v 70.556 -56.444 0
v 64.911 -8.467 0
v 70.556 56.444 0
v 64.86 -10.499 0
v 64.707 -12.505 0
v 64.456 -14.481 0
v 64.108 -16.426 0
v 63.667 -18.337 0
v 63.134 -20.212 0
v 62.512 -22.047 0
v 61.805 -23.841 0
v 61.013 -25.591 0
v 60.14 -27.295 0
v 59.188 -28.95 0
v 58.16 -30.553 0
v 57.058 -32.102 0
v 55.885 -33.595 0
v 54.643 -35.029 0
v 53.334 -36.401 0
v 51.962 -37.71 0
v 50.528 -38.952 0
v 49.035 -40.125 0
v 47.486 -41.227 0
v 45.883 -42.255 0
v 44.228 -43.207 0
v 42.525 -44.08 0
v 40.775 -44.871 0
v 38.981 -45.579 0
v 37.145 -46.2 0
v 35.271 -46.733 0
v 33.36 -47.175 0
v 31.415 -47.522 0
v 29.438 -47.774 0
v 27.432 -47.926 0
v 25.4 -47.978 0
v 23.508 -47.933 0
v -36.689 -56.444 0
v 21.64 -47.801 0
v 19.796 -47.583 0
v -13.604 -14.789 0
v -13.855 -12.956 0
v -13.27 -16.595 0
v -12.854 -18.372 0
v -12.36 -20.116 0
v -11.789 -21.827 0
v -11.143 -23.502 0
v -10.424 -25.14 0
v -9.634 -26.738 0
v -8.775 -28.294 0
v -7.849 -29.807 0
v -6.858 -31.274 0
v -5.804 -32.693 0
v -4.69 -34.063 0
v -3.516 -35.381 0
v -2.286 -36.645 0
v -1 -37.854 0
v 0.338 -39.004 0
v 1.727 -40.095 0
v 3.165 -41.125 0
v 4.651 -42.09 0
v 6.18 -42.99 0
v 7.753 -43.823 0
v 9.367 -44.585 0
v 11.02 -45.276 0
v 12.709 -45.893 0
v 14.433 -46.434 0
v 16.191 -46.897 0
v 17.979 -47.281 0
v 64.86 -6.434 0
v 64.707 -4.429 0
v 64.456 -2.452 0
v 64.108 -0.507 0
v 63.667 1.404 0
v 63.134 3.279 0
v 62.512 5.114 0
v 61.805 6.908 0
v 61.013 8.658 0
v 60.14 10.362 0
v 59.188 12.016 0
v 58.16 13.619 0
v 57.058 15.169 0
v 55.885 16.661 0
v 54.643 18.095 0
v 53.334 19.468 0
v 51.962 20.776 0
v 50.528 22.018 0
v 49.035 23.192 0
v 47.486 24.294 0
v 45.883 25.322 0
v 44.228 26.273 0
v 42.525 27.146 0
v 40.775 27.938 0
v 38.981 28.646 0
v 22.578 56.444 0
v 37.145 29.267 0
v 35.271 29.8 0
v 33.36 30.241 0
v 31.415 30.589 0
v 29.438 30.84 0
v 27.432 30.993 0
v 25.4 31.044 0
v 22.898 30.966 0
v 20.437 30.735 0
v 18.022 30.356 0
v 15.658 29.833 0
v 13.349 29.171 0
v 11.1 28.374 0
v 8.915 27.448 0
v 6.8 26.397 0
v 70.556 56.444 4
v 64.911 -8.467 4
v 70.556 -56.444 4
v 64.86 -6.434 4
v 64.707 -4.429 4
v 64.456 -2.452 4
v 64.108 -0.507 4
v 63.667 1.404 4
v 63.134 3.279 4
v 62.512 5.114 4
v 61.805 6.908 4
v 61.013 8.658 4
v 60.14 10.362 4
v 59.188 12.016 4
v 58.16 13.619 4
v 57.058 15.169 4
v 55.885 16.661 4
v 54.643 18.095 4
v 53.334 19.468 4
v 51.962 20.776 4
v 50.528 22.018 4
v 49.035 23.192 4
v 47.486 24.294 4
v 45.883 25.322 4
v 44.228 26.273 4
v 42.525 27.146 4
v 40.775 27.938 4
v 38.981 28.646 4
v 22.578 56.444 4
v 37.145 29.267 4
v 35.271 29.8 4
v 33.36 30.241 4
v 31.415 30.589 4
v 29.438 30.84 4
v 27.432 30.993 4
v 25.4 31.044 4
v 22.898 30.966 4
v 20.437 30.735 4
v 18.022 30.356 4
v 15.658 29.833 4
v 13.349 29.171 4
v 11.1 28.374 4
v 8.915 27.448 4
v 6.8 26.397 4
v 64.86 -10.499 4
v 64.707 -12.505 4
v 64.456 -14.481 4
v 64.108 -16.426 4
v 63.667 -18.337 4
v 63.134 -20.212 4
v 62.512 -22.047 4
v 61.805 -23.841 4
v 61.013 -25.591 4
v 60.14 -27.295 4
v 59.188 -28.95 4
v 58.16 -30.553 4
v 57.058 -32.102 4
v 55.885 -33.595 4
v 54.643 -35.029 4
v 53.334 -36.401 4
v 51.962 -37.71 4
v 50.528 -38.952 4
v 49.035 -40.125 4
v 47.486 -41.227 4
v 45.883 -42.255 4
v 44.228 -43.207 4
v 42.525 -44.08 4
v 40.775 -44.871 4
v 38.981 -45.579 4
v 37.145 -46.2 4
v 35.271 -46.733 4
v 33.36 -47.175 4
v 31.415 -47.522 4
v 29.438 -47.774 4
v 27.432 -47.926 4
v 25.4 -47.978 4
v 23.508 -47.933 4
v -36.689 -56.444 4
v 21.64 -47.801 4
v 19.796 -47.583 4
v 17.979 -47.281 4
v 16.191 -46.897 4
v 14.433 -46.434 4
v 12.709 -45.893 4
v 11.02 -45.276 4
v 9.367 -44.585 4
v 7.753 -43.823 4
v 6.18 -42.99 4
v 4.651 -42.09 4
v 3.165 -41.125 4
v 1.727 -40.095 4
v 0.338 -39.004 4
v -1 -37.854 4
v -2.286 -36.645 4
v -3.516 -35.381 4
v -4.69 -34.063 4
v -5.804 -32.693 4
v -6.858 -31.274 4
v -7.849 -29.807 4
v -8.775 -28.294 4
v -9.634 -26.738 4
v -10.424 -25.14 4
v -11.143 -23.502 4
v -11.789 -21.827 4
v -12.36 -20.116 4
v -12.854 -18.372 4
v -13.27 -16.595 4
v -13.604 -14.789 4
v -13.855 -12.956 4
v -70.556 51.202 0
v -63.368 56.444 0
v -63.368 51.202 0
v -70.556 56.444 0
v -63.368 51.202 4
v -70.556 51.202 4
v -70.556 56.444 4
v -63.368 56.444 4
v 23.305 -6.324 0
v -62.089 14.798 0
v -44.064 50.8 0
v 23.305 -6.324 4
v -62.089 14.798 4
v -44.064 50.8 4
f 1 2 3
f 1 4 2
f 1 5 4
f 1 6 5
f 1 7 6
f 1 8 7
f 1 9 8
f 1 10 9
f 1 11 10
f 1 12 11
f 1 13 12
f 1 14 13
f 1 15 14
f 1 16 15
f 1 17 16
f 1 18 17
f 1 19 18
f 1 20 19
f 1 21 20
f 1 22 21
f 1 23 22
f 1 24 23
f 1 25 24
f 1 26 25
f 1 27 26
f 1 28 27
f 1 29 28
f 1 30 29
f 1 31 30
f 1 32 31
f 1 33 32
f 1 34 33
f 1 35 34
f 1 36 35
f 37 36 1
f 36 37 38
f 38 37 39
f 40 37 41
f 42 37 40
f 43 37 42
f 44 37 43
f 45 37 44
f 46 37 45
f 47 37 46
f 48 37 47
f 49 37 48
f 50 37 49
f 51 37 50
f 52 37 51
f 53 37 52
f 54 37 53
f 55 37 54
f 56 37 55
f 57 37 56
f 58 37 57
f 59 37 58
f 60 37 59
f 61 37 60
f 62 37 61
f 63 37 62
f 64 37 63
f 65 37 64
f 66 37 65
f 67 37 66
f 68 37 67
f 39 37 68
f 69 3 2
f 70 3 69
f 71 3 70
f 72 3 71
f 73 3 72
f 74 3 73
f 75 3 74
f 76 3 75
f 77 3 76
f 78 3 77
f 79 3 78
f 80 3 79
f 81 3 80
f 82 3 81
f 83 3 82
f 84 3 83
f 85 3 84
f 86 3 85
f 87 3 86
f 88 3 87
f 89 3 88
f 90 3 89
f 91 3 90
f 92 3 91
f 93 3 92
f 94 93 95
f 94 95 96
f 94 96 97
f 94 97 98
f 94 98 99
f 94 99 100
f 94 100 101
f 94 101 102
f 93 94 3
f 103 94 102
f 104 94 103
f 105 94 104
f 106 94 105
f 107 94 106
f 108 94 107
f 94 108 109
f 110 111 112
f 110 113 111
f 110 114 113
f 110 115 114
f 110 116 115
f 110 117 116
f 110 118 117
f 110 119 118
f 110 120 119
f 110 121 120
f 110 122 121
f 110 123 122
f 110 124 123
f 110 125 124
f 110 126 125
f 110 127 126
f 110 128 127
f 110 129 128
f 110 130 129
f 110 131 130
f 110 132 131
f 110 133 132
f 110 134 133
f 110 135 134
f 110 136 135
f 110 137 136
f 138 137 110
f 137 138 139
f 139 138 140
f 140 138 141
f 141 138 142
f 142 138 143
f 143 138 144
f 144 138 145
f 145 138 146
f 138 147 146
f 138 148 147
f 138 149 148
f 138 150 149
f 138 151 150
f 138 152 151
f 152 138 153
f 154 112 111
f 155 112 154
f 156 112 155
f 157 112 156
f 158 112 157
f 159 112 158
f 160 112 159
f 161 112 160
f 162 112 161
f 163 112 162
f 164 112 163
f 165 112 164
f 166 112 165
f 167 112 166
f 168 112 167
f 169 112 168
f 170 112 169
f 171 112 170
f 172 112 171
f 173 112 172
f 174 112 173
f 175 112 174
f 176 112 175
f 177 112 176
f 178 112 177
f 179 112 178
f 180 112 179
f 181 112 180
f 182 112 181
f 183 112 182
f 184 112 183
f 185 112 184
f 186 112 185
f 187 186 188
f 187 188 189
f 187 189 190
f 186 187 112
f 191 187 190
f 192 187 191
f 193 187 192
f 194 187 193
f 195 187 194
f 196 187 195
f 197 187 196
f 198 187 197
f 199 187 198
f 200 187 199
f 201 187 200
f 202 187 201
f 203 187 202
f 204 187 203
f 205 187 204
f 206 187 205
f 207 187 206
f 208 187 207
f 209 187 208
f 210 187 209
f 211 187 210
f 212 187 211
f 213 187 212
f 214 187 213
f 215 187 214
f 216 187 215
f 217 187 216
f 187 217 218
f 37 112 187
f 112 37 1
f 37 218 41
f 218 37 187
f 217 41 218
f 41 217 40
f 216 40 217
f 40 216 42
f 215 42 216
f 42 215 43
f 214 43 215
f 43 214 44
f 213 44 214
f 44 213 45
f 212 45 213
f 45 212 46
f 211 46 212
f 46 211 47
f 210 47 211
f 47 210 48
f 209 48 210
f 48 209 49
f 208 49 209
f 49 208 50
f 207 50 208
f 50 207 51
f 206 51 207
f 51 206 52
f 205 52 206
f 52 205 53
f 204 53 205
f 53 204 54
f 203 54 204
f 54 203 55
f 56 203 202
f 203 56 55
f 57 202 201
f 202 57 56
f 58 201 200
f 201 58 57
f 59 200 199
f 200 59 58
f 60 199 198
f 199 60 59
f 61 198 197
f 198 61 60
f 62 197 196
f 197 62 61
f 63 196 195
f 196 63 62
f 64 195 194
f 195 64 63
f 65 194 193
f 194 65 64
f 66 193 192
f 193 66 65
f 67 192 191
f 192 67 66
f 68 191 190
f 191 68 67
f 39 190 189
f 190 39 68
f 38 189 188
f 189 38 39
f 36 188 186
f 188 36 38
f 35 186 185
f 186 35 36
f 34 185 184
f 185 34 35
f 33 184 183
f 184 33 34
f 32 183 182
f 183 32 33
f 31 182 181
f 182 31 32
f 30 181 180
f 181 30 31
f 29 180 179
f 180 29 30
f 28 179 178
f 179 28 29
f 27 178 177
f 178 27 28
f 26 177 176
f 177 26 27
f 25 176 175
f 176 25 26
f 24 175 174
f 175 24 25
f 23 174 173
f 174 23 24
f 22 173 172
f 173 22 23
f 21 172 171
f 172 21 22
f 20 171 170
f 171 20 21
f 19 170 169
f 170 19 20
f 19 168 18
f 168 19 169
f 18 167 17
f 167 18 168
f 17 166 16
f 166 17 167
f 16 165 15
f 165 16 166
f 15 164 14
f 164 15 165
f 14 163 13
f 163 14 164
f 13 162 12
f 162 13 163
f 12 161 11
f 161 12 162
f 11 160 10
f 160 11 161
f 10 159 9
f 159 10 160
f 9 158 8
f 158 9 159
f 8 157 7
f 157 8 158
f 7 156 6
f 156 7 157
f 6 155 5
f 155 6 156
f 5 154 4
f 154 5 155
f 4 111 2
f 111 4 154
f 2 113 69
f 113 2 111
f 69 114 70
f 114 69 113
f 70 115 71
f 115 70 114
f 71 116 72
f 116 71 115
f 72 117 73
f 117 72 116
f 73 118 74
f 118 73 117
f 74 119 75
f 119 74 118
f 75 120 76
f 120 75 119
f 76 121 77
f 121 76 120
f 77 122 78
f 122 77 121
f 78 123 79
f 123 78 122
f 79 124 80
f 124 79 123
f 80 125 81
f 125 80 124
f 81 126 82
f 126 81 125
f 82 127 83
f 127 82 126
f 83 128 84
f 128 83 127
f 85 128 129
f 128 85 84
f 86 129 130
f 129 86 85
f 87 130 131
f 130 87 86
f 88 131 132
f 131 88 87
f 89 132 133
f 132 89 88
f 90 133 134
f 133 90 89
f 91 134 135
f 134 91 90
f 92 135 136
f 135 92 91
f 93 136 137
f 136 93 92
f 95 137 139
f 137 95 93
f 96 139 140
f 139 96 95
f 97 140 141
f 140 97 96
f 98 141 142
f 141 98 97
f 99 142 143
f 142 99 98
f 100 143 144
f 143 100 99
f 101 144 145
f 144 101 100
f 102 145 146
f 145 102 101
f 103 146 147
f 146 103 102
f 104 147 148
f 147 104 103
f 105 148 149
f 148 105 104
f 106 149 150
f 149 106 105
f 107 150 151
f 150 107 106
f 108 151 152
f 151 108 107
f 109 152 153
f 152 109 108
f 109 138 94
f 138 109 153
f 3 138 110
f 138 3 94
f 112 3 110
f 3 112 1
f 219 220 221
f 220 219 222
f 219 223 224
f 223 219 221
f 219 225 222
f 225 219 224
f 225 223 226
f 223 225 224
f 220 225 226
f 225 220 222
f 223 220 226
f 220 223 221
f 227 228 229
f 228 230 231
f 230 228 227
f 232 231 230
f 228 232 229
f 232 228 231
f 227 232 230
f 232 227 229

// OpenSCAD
// Module names are of the form poly_<inkscape-path-id>().
// As a result you can associate a polygon in this OpenSCAD program with the
//  corresponding SVG element in the Inkscape document by looking for 
//  the XML element with the attribute id="inkscape-path-id".

// Paths have their own variables so they can be imported and used 
//  in polygon(points) structures in other programs.
// The NN_points is the list of all polygon XY vertices. 
// There may be an NN_paths variable as well. If it exists then it 
//  defines the nested paths. Both must be used in the 
//  polygon(points, paths) variant of the command.

profile_scale = 25.4/90; //made in inkscape in mm

// helper functions to determine the X,Y dimensions of the profiles
function min_x(shape_points) = min([ for (x = shape_points) min(x[0])]);
function max_x(shape_points) = max([ for (x = shape_points) max(x[0])]);
function min_y(shape_points) = min([ for (x = shape_points) min(x[1])]);
function max_y(shape_points) = max([ for (x = shape_points) max(x[1])]);

height = 4;
width = 1.0;


path3192_0_points = [[80.000000,-200.000000],[24.093750,-93.531250],[31.588654,-97.256080],[39.329082,-100.537912],[47.298468,-103.360211],[55.480249,-105.706443],[63.857857,-107.560072],[72.414729,-108.904564],[81.134298,-109.723385],[90.000000,-110.000000],[97.200874,-109.817720],[104.307617,-109.276758],[111.311411,-108.385933],[118.203437,-107.154062],[124.974878,-105.589966],[131.616914,-103.702461],[138.120728,-101.500366],[144.477500,-98.992500],[150.678413,-96.187681],[156.714648,-93.094727],[162.577388,-89.722456],[168.257812,-86.079688],[173.747104,-82.175239],[179.036445,-78.017930],[184.117017,-73.616577],[188.980000,-68.980000],[193.616577,-64.117017],[198.017930,-59.036445],[202.175239,-53.747104],[206.079687,-48.257812],[209.722456,-42.577388],[213.094727,-36.714648],[216.187681,-30.678413],[218.992500,-24.477500],[221.500366,-18.120728],[223.702461,-11.616914],[225.589966,-4.974878],[227.154063,1.796563],[228.385933,8.688589],[229.276758,15.692383],[229.817720,22.799126],[230.000000,30.000000],[229.817720,37.200874],[229.276758,44.307617],[228.385933,51.311411],[227.154063,58.203437],[225.589966,64.974878],[223.702461,71.616914],[221.500366,78.120728],[218.992500,84.477500],[216.187681,90.678413],[213.094727,96.714648],[209.722456,102.577388],[206.079687,108.257812],[202.175239,113.747104],[198.017930,119.036445],[193.616577,124.117017],[188.980000,128.980000],[184.117017,133.616577],[179.036445,138.017930],[173.747104,142.175239],[168.257812,146.079687],[162.577388,149.722456],[156.714648,153.094727],[150.678413,156.187681],[144.477500,158.992500],[138.120728,161.500366],[131.616914,163.702461],[124.974878,165.589966],[118.203437,167.154063],[111.311411,168.385933],[104.307617,169.276758],[97.200874,169.817720],[90.000000,170.000000],[83.297507,169.842111],[76.676022,169.373180],[70.142643,168.600310],[63.704468,167.530606],[57.368595,166.171172],[51.142121,164.529111],[45.032146,162.611528],[39.045766,160.425527],[33.190080,157.978211],[27.472186,155.276684],[21.899182,152.328051],[16.478166,149.139415],[11.216236,145.717881],[6.120490,142.070551],[1.198025,138.204532],[-3.544059,134.126925],[-8.098665,129.844836],[-12.458695,125.365367],[-16.617051,120.695624],[-20.566635,115.842710],[-24.300350,110.813729],[-27.811096,105.615785],[-31.091776,100.255982],[-34.135291,94.741423],[-36.934545,89.079214],[-39.482439,83.276458],[-41.771874,77.340258],[-43.795754,71.277719],[-45.546979,65.095945],[-47.018452,58.802039],[-48.203075,52.403106],[-49.093750,45.906250],[-130.000000,200.000000],[250.000000,200.000000],[250.000000,-200.000000],[80.000000,-200.000000],[80.000000,-200.000000]];

module poly_path3192(h, w, res=4)  {
  scale([profile_scale, -profile_scale, 1])
  union()  {
    linear_extrude(height=h)
      polygon(path3192_0_points);
  }
}

rect817_0_points = [[-250.000000,-200.000000],[-224.532171,-200.000000],[-224.532171,-181.423466],[-250.000000,-181.423466],[-250.000000,-200.000000]];

module poly_rect817(h, w, res=4)  {
  scale([profile_scale, -profile_scale, 1])
  union()  {
    linear_extrude(height=h)
      polygon(rect817_0_points);
  }
}

path3199_0_points = [[-156.130883,-180.000000],[-220.000000,-52.433550],[82.578370,22.409090],[-156.130883,-180.000000],[-156.130883,-180.000000]];

module poly_path3199(h, w, res=4)  {
  scale([profile_scale, -profile_scale, 1])
  union()  {
    linear_extrude(height=h)
      polygon(path3199_0_points);
  }
}

// The shapes
poly_path3192(height, width);
poly_rect817(height, width);
poly_path3199(height, width);
